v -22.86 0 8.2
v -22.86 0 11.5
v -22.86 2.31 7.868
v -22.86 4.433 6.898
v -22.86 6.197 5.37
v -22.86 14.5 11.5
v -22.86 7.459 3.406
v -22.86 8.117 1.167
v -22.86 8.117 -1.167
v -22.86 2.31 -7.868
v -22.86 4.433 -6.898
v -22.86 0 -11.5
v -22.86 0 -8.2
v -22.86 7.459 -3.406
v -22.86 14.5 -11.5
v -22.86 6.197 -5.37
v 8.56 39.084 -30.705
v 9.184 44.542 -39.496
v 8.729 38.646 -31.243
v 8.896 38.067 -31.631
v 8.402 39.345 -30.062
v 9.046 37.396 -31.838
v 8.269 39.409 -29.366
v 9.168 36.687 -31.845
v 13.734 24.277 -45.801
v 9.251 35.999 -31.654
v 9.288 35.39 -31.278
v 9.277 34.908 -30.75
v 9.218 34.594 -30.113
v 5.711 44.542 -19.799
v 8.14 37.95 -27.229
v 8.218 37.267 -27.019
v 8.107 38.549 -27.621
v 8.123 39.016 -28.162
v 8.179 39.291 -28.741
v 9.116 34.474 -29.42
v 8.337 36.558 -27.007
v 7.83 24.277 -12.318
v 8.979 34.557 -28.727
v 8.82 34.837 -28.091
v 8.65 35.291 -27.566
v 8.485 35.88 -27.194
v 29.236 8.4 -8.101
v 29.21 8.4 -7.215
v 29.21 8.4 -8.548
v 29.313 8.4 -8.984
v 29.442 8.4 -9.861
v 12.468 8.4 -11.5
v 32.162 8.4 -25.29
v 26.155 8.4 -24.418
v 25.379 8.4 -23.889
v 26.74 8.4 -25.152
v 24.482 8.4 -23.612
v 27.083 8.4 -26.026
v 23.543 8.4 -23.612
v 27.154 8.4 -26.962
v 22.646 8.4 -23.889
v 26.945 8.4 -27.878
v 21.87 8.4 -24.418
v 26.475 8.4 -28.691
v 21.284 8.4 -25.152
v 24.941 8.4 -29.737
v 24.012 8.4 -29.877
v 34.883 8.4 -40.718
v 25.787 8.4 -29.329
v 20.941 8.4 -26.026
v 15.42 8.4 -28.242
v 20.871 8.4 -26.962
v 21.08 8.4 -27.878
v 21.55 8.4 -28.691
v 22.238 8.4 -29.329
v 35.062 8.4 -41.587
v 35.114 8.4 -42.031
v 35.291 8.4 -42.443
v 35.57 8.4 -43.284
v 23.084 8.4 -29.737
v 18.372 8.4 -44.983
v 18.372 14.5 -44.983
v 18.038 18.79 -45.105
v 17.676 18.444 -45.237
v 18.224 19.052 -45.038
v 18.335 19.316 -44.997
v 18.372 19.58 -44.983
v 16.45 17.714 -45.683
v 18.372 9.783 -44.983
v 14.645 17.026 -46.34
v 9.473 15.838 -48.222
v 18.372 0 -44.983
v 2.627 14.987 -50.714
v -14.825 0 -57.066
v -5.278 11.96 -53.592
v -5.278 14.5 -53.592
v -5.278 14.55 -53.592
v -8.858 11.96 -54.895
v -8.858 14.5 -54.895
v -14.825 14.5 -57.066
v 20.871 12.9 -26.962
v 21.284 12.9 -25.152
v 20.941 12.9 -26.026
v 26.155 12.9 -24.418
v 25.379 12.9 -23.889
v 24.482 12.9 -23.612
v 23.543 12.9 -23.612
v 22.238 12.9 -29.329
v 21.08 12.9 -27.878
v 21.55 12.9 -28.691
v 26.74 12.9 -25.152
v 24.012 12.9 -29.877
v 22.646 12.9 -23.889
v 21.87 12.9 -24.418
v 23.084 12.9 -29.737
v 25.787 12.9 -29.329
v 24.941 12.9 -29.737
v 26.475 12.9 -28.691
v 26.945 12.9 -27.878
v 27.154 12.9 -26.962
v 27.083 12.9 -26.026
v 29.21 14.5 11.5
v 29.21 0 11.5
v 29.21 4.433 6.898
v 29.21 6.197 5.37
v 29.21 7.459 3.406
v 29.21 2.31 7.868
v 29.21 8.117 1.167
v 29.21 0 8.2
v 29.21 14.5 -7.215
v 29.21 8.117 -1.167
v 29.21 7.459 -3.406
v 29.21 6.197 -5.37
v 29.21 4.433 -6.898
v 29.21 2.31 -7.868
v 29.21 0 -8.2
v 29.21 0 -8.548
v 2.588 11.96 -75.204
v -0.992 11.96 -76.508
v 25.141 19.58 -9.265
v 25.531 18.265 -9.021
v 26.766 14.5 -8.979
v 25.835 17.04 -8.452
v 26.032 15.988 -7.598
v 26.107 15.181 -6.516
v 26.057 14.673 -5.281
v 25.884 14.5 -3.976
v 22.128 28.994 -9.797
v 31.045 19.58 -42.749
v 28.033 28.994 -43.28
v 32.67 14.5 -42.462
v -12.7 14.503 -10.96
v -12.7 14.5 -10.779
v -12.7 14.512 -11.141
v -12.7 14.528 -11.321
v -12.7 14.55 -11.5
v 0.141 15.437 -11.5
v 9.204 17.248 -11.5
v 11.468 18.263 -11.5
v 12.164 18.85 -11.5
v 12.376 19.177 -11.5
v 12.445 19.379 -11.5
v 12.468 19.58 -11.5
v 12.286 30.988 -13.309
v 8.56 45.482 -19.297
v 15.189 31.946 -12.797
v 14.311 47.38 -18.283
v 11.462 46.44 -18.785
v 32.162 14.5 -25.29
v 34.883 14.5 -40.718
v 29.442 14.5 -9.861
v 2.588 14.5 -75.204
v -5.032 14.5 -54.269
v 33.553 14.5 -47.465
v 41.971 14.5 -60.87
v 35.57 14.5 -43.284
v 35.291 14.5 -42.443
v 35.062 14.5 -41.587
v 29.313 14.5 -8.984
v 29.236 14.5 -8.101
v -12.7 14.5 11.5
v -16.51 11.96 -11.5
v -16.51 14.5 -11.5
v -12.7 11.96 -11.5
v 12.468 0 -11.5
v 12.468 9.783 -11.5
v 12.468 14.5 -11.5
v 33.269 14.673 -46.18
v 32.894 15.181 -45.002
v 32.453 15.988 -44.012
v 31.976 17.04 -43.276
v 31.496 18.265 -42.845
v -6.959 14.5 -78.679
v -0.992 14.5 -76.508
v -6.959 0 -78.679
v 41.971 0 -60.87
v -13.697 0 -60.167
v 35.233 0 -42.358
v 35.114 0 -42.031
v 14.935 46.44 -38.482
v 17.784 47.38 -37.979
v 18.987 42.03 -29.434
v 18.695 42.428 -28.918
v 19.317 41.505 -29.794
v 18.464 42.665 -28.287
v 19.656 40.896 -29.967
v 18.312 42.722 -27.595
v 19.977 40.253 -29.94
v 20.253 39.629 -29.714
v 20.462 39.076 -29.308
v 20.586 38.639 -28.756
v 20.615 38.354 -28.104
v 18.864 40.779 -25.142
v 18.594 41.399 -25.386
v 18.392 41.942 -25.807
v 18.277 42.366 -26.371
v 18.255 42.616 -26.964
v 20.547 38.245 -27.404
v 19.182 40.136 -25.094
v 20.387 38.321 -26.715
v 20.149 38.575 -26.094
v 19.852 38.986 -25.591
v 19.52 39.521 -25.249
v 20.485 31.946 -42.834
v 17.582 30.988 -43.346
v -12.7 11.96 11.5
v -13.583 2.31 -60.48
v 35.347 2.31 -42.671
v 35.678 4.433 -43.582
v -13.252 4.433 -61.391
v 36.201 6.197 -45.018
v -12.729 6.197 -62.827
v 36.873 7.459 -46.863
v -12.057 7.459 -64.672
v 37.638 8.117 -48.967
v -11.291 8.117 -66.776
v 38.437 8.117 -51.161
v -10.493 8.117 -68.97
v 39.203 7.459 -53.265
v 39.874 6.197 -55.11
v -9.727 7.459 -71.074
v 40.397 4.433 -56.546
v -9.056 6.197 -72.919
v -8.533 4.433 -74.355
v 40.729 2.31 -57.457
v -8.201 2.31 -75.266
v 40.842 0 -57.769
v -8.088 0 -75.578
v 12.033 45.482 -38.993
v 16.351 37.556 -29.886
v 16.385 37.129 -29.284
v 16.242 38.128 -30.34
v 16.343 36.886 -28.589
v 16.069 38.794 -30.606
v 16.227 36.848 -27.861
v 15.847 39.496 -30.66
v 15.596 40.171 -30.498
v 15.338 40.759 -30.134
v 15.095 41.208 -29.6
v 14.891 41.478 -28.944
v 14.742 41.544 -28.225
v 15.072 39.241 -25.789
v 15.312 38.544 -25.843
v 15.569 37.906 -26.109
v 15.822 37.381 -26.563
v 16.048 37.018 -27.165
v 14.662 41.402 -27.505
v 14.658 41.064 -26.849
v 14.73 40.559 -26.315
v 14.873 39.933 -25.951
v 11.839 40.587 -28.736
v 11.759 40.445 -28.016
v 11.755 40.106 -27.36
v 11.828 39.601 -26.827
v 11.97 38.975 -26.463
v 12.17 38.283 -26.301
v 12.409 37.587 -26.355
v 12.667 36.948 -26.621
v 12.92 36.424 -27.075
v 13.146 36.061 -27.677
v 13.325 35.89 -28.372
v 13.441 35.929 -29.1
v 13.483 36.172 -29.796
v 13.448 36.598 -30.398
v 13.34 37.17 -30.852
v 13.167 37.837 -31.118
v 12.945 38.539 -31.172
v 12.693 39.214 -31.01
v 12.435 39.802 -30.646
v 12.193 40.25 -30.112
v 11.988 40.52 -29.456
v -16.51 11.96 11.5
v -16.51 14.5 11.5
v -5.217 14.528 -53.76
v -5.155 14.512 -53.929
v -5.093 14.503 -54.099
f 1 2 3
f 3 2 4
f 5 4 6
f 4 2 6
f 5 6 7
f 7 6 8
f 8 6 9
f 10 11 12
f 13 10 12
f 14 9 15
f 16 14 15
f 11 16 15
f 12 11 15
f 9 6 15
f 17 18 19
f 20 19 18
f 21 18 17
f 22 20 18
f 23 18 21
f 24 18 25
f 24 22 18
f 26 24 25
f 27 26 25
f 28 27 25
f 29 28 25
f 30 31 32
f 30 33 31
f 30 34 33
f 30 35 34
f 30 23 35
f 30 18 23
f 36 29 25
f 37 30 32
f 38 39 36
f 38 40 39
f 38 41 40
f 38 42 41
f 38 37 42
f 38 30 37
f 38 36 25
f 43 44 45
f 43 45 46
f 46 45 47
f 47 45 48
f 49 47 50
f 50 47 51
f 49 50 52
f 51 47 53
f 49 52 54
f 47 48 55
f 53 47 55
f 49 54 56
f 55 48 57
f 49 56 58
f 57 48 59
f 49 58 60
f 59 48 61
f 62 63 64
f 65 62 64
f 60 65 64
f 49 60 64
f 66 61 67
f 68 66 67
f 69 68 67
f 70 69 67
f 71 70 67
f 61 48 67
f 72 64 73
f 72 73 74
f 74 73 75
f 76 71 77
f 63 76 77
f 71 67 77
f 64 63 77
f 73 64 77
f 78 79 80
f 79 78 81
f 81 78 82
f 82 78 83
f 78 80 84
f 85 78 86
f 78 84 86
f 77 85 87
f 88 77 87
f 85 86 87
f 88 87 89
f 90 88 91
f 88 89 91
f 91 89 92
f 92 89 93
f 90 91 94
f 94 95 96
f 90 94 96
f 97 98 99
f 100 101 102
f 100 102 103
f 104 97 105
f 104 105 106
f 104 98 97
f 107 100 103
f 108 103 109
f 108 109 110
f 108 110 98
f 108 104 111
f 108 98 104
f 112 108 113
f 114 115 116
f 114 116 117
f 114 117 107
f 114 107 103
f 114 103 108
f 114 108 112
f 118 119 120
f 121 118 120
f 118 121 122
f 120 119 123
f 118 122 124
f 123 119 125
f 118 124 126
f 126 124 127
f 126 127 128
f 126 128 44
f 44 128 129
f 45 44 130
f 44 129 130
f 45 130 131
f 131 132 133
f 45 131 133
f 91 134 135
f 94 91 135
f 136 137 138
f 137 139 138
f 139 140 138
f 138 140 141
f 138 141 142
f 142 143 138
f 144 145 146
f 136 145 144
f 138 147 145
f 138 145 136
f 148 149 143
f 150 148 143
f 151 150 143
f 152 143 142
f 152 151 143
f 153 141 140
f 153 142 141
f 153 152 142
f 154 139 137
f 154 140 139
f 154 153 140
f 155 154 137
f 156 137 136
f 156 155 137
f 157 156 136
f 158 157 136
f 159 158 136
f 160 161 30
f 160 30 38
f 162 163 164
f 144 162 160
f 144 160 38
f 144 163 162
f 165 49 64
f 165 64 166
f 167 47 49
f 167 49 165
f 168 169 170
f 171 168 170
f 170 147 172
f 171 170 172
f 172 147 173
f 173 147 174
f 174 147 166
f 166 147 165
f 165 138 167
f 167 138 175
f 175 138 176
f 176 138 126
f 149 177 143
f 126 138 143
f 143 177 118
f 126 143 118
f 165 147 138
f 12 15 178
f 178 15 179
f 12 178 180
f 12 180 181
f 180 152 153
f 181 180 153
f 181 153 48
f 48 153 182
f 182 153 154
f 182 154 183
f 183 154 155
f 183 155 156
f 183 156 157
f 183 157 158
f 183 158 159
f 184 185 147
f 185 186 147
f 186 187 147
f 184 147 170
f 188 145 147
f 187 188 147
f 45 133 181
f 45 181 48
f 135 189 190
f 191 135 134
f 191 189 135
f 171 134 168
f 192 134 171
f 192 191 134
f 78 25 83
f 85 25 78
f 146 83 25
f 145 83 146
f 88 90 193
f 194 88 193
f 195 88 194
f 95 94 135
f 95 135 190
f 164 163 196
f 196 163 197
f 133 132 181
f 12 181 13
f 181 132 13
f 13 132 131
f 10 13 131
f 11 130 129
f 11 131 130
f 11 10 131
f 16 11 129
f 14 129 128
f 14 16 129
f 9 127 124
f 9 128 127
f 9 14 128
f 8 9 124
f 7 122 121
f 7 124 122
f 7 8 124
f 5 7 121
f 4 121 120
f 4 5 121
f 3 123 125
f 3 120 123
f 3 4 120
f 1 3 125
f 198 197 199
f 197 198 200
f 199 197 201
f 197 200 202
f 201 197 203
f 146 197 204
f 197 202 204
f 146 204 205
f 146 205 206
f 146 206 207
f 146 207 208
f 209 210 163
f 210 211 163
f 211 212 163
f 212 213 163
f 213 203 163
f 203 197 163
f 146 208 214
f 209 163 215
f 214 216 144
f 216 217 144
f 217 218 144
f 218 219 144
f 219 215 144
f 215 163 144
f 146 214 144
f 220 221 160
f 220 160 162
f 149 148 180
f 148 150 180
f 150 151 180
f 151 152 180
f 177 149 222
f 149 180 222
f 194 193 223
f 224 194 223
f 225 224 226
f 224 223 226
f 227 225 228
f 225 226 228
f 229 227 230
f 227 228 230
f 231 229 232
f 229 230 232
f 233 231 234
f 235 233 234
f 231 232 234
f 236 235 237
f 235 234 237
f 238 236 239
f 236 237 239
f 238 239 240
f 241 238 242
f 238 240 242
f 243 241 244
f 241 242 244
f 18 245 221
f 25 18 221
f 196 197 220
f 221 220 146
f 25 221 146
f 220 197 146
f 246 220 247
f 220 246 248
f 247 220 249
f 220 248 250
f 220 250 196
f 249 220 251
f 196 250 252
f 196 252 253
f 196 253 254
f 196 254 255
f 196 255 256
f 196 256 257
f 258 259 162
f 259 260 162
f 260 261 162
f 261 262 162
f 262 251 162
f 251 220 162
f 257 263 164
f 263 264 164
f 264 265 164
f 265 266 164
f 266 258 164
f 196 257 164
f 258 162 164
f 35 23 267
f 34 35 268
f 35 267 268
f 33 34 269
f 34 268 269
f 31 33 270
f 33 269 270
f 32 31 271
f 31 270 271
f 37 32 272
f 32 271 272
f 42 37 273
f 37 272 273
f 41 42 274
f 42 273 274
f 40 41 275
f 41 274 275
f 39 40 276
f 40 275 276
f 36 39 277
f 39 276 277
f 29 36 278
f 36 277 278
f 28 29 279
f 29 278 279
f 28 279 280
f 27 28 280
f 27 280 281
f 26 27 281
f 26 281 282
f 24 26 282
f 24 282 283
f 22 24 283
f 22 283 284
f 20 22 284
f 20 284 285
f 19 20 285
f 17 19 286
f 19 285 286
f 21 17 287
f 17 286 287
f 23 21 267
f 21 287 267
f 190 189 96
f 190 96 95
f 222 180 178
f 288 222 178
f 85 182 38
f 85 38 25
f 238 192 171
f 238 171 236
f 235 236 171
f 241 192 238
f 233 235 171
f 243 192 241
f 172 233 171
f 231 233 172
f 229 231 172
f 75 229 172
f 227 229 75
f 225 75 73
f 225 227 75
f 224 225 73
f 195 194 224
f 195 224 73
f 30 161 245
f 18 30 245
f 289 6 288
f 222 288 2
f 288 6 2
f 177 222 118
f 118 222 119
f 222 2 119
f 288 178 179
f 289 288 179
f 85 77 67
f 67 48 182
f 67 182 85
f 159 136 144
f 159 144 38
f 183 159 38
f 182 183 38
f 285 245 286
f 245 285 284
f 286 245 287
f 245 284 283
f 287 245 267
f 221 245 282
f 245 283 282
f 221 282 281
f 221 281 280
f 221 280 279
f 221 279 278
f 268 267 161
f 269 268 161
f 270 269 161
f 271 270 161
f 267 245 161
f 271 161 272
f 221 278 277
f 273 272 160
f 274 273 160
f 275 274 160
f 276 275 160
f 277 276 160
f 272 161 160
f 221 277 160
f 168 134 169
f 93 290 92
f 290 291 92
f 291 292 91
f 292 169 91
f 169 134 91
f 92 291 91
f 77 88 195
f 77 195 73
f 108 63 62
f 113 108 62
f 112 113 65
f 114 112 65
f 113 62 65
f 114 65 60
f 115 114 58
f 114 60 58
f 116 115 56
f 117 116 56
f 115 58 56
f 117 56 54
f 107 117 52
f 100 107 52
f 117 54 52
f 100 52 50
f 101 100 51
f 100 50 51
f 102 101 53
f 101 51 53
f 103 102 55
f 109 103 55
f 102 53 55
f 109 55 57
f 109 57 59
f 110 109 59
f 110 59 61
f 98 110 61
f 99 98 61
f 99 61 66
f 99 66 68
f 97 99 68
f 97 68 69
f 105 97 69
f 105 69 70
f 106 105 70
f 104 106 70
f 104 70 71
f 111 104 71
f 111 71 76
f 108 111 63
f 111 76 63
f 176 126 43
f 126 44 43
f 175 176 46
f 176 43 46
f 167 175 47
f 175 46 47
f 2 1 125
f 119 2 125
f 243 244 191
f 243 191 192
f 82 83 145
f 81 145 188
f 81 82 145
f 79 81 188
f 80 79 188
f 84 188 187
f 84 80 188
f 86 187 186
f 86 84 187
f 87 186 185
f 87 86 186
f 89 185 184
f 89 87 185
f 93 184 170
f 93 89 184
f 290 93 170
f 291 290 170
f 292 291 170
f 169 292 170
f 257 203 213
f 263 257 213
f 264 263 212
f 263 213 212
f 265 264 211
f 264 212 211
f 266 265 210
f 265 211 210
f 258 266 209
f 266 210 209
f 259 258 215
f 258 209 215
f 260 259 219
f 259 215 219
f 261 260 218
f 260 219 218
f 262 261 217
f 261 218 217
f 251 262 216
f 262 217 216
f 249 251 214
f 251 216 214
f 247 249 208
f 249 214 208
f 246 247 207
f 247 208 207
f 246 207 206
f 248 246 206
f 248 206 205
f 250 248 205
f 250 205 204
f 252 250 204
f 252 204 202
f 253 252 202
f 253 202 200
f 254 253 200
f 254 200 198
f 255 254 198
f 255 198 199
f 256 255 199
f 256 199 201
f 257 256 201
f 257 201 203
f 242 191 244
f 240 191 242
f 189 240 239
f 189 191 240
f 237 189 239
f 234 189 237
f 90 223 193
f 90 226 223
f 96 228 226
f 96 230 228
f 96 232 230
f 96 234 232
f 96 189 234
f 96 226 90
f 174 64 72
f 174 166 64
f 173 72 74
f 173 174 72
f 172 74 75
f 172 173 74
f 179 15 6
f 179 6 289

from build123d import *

# Parameters (mm, degrees)
SKETCH2_W                  = 58.42
SKETCH2_H                  = 23
TWOLEGS_DEPTH              = 14.5
LEGSLOTS_DEPTH             = 62.281289151
SKETCH6_W                  = 3.81
SKETCH6_H                  = 2.54
GROOVE_DEPTH               = 25.4
MIDDLEBRIDGECUT_DEPTH      = 25.4
SKETCH8_W                  = 17
SKETCH8_H                  = 14.5
BRIDGE_DEPTH               = 17
BRIDGEUNDERCUT_REACH       = 53.567
SKETCH15_W                 = 17
SKETCH15_H                 = 8.4
MIRROR14_START             = 10.281893146
MIRROR14_OUTLINE_W         = 6.1
MIRROR14_OUTLINE_H         = 17
MIRROR14_DEPTH             = 17
CLAMPINCLINE_DEPTH         = 17
EXTRUDECONNECTOR_DEPTH     = 35.56
CONNECTORDRAFT_REACH       = 111.361
CONNECTORGROOVE_REACH      = 94.034
CONNECTORHOLE_REACH        = 111.361
SKETCH25_R                 = 2.4765
SKETCH26_R                 = 3.15
BRIDGEHOLE_DEPTH           = 4.5
FILLET1_R                  = 15.24
FILLET2_R                  = 5.08
CONNECTORDRAFT2_DEPTH      = 93.034308057
CONNECTORDRAFT2_DEPTH_BACK = 93.034308057
LEGSHORTEN_REACH           = 98.848
SKETCH28_W                 = 6.35
SKETCH28_H                 = 23


with BuildPart() as part:
    # Sketch2 → twolegs (new body)
    with BuildSketch(Plane(origin=(0, 0, 0), x_dir=(1, 0, 0), z_dir=(0, 1, 0))):
        Rectangle(SKETCH2_W, SKETCH2_H)
    twolegs = extrude(amount=TWOLEGS_DEPTH)

    # Sketch4 → legslots (cut, symmetric)
    with BuildSketch(Plane.ZY.offset(29.21)):
        with BuildLine():
            Line((-8.2, -58.921978701), (-8.2, 0))
            ThreePointArc((-8.2, 0), (0, 8.2), (8.2, 0))
            Line((8.2, 0), (8.2, -58.921978701))
            Line((8.2, -58.921978701), (8.2, -176.765936102))
            Line((8.2, -176.765936102), (-8.2, -176.765936102))
            Line((-8.2, -176.765936102), (-8.2, -58.921978701))
        make_face()
    legslots = extrude(amount=LEGSLOTS_DEPTH, both=True, mode=Mode.SUBTRACT)

    # Sketch6 → groove (cut)
    with BuildSketch(Plane(origin=(0, 0, -11.5), x_dir=(-1, 0, 0), z_dir=(0, 0, -1))):
        with Locations((14.605, 13.23)):
            Rectangle(SKETCH6_W, SKETCH6_H)
    groove = extrude(amount=-GROOVE_DEPTH, mode=Mode.SUBTRACT)

    # Sketch7 → middlebridgecut (cut)
    with BuildSketch(Plane(origin=(0, 14.5, 0), x_dir=(1, 0, 0), z_dir=(0, 1, 0))):
        Polygon((12.468268199, 11.5), (29.21, 8.54798098), (29.21, 11.5), align=None)
    extrude(amount=-MIDDLEBRIDGECUT_DEPTH, mode=Mode.SUBTRACT)

    # Sketch8 → bridge (add)
    with BuildSketch(Plane(origin=(2.342580113, 0, -13.285432008), x_dir=(-0.9848077530122094, 0, -0.17364817766692317), z_dir=(0.17364817766692317, 0, -0.9848077530122094))):
        with Locations((-18.781893146, 7.25)):
            Rectangle(SKETCH8_W, SKETCH8_H)
    extrude(amount=BRIDGE_DEPTH)

    # Sketch15 → bridgeundercut (cut, up to next)
    with BuildSketch(Plane(origin=(10.125688085, 0, 1.785432008), x_dir=(-0.17364817766692317, 0, 0.9848077530122095), z_dir=(-0.9848077530122095, 0, -0.17364817766692317)), mode=Mode.PRIVATE) as bridgeundercut_sk1:
        with Locations((-21.990381211, 4.2)):
            Rectangle(SKETCH15_W, SKETCH15_H)
    bridgeundercut_tool1 = extrude(bridgeundercut_sk1.sketch, amount=-BRIDGEUNDERCUT_REACH, mode=Mode.PRIVATE) & part.part
    bridgeundercut = bridgeundercut_tool1.solids().sort_by_distance((13.944278, 4.2, -19.870866))[0]
    add(bridgeundercut, mode=Mode.SUBTRACT)

    # Mirror14: read off the stored shape, not the designer's step
    # Mirror14 outline → Mirror14 (add)
    with BuildSketch(Plane(origin=(0, 0, 0), x_dir=(0, 1, 0), z_dir=(0.9848077530122094, 0, 0.17364817766692306)).offset(MIRROR14_START)):
        with Locations((11.45, -38.990381211)):
            Rectangle(MIRROR14_OUTLINE_W, MIRROR14_OUTLINE_H)
    extrude(amount=MIRROR14_DEPTH)

    # Mirror15: twolegs across plane
    add(twolegs.mirror(Plane(origin=(5.294599134, 0, -30.027163809), x_dir=(0.9848077530122092, 0, 0.17364817766692314), z_dir=(0.17364817766692314, 0, -0.9848077530122094))))

    # Mirror16: legslots, groove, bridgeundercut across plane
    add(legslots.mirror(Plane(origin=(5.294599134, 0, -30.027163809), x_dir=(0.9848077530122092, 0, 0.17364817766692314), z_dir=(0.17364817766692314, 0, -0.9848077530122094))), mode=Mode.SUBTRACT)
    add(groove.mirror(Plane(origin=(5.294599134, 0, -30.027163809), x_dir=(0.9848077530122092, 0, 0.17364817766692314), z_dir=(0.17364817766692314, 0, -0.9848077530122094))), mode=Mode.SUBTRACT)
    add(bridgeundercut.mirror(Plane(origin=(5.294599134, 0, -30.027163809), x_dir=(0.9848077530122092, 0, 0.17364817766692314), z_dir=(0.17364817766692314, 0, -0.9848077530122094))), mode=Mode.SUBTRACT)

    # Sketch21 → clampincline (cut, symmetric)
    with BuildSketch(Plane(origin=(5.294599134, 0, -30.027163809), x_dir=(-0.9848077530122094, 0, -0.17364817766692314), z_dir=(0.17364817766692314, 0, -0.9848077530122094))):
        Polygon((-24.800533146, 14.5), (-10.281893146, 9.782607901), (-10.281893146, 14.5), align=None)
    extrude(amount=CLAMPINCLINE_DEPTH, both=True, mode=Mode.SUBTRACT)

    # Sketch22 → extrudeconnector (add)
    with BuildSketch(Plane(origin=(-1.864440892, 5.826679393, -0.328751233), x_dir=(-0.19370062592752282, -0.006629130978421877, 0.98103828780418), z_dir=(-0.30432233187297286, 0.9510565162951554, -0.05366023794131847))):
        Polygon((-48.081564355, 27.0422172), (-14.089388689, 27.771596028), (-13.761901853, 12.509307601), (-47.754077519, 11.779928772), align=None)
    extrude(amount=EXTRUDECONNECTOR_DEPTH)

    # Sketch23 → connectordraft (cut, up to next)
    with BuildSketch(Plane(origin=(26.288198213, 8.673320607, 4.635318619), x_dir=(0.3484357800023436, -0.8710369750422688, -0.34624715930007605), z_dir=(0.9366078308002519, 0.30901699437494146, 0.16514923091290587)), mode=Mode.PRIVATE) as connectordraft_sk1:
        Polygon((-21.922562345, 53.820435592), (-0.501791973, 52.073152935), (-19.112117469, 60.231472918), align=None)
    connectordraft_tool1 = extrude(connectordraft_sk1.sketch, amount=-CONNECTORDRAFT_REACH, mode=Mode.PRIVATE) & part.part
    # Sketch23 → connectordraft (cut, up to next)
    with BuildSketch(Plane(origin=(26.288198213, 8.673320607, 4.635318619), x_dir=(0.3484357800023436, -0.8710369750422688, -0.34624715930007605), z_dir=(0.9366078308002519, 0.30901699437494146, 0.16514923091290587)), mode=Mode.PRIVATE) as connectordraft_sk2:
        Polygon((-14.152524229, 20.933828779), (-32.762849725, 29.092148762), (-29.952404848, 35.503186089), align=None)
    connectordraft_tool2 = extrude(connectordraft_sk2.sketch, amount=-CONNECTORDRAFT_REACH, mode=Mode.PRIVATE) & part.part
    add(connectordraft_tool1.solids().sort_by_distance((23.504771, 41.877747, -41.709143))[0], mode=Mode.SUBTRACT)
    add(connectordraft_tool2.solids().sort_by_distance((18.411091, 41.877747, -12.821449))[0], mode=Mode.SUBTRACT)

    # connectorgroove: up to this plane
    connectorgroove_end = Plane(origin=(-43.786464147, 27.065475321, -48.835745626), z_dir=(-0.06506049659943954, -0.3097627963249175, 0.9485853371179643))
    # Sketch24 → connectorgroove (cut, up to the surface)
    with BuildSketch(Plane(origin=(2.342580113, 0, -13.285432008), x_dir=(-0.9848077530122095, 0, -0.1736481776669232), z_dir=(0.1736481776669232, 0, -0.9848077530122095)), mode=Mode.PRIVATE) as connectorgroove_sk1:
        Polygon((-9.788420854, 30.987981431), (-12.735554786, 31.945563293), (-8.026135792, 46.439664601), (-5.079001859, 45.482082739), align=None)
    connectorgroove_tool1 = split(extrude(connectorgroove_sk1.sketch, amount=CONNECTORGROOVE_REACH, mode=Mode.PRIVATE), bisect_by=connectorgroove_end, keep=Keep.BOTH, mode=Mode.PRIVATE)
    add(connectorgroove_tool1.solids().sort_by_distance((11.114537, 38.713823, -11.738699))[0], mode=Mode.SUBTRACT)

    # connectorhole: up to this face of the body (flat: up to its plane)
    connectorhole_end = Plane(part.part.faces().sort_by_distance((10.456046087, 25.296664487, -29.117061452))[0])
    # Sketch25 → connectorhole (cut, up to the picked face)
    with BuildSketch(Plane(origin=(26.288198213, 8.673320607, 4.635318619), x_dir=(0.3484357800023436, -0.8710369750422688, -0.34624715930007605), z_dir=(0.9366078308002519, 0.30901699437494146, 0.16514923091290587)), mode=Mode.PRIVATE) as connectorhole_sk1:
        with Locations(Location((-18.958611536, 41.602440846, 0), (0, 0, 159.447358614))):
            Circle(SKETCH25_R)
    connectorhole_tool1 = split(extrude(connectorhole_sk1.sketch, amount=-CONNECTORHOLE_REACH, mode=Mode.PRIVATE), bisect_by=connectorhole_end, keep=Keep.BOTH, mode=Mode.PRIVATE)
    add(connectorhole_tool1.solids().sort_by(Axis((21.215591, 41.072519, -27.219863), (-0.9366078308002519, -0.30901699437494146, -0.16514923091290587)))[0], mode=Mode.SUBTRACT)

    # Sketch26 → bridgehole (cut)
    with BuildSketch(Plane.XZ.offset(-8.4)):
        with Locations(Location((24.012358933, -26.726717738, 0), (0, 0, 270))):
            Circle(SKETCH26_R)
    extrude(amount=-BRIDGEHOLE_DEPTH, mode=Mode.SUBTRACT)

    # Fillet1
    fillet1_edges = [part.edges().sort_by_distance(p)[0] for p in [
        (29.21, 11.45, -8.54798098),
        (35.114038041, 11.45, -42.031444582),
    ]]
    fillet(fillet1_edges, radius=FILLET1_R)

    # Fillet2
    # the kernel refuses this fillet: 5.08 mm, written as the material it adds along each edge
    with BuildSketch(Plane(origin=(-25.052907191, 14.5, -18.115995569), x_dir=(-0.17364817766692314, 0, 0.9848077530122094), z_dir=(0.9848077530122094, 0, 0.17364817766692314))) as fillet2_piece_1_section:
        with BuildLine():
            CenterArc((FILLET2_R, -FILLET2_R), FILLET2_R, 90, 90)
            Line((0, -FILLET2_R), (0, 0))
            Line((0, 0), (FILLET2_R, 0))
        make_face()
    fillet2_piece_1 = extrude(amount=65.31864, mode=Mode.PRIVATE)
    fillet2_piece_1 = split(fillet2_piece_1, bisect_by=Plane(origin=(-12.7, 14.5, -18.115995569), z_dir=(1, 0, 0)), keep=Keep.TOP, mode=Mode.PRIVATE)
    fillet2_piece_1 = split(fillet2_piece_1, bisect_by=Plane(origin=(-25.052907191, 14.5, -11.5), z_dir=(0, 0, 1)), keep=Keep.TOP, mode=Mode.PRIVATE)
    fillet2_piece_1 = split(fillet2_piece_1, bisect_by=Plane(origin=(21.81803989, 29.964230294, -9.851382987), z_dir=(-0.9366078308002517, -0.30901699437494173, -0.16514923091290615)), keep=Keep.TOP, mode=Mode.PRIVATE)
    add(fillet2_piece_1)
    with BuildSketch(Plane(origin=(-19.14886915, 14.5, -51.599459172), x_dir=(0.17364817766692314, 0, -0.9848077530122094), z_dir=(0.9848077530122094, 0, 0.17364817766692314))) as fillet2_piece_2_section:
        with BuildLine():
            CenterArc((FILLET2_R, FILLET2_R), FILLET2_R, 180, 90)
            Line((0, FILLET2_R), (0, 0))
            Line((0, 0), (FILLET2_R, 0))
        make_face()
    fillet2_piece_2 = extrude(amount=65.31864, mode=Mode.PRIVATE)
    fillet2_piece_2 = split(fillet2_piece_2, bisect_by=Plane(origin=(27.722077931, 29.964230294, -43.33484659), z_dir=(-0.9366078308002517, -0.30901699437494173, -0.16514923091290615)), keep=Keep.TOP, mode=Mode.PRIVATE)
    fillet2_piece_2 = split(fillet2_piece_2, bisect_by=Plane(origin=(-7.540933418, 14.5, -47.374516084), z_dir=(0.9396926207859135, 0, 0.342020143325655)), keep=Keep.TOP, mode=Mode.PRIVATE)
    fillet2_piece_2 = split(fillet2_piece_2, bisect_by=Plane(origin=(-16.886065398, 14.5, -57.816461387), z_dir=(0.342020143325655, 0, -0.9396926207859134)), keep=Keep.TOP, mode=Mode.PRIVATE)
    add(fillet2_piece_2)

    # Sketch27 → connectordraft2 (cut, two sides: drawn at the far end of the back side and taken through both)
    with BuildSketch(Plane(origin=(2.342580113, 0, -13.285432008), x_dir=(-0.9848077530122095, 0, -0.1736481776669232), z_dir=(0.1736481776669232, 0, -0.9848077530122095)).offset(-CONNECTORDRAFT2_DEPTH_BACK)):
        Polygon((-10.919012309, 47.37961716), (-20.091114151, 28.994101308), (-13.811888826, 48.319569719), align=None)
        Polygon((-2.186125342, 44.54213018), (-5.572474151, 24.27670921), (0.706751174, 43.602177621), align=None)
    extrude(amount=CONNECTORDRAFT2_DEPTH + CONNECTORDRAFT2_DEPTH_BACK, mode=Mode.SUBTRACT)

    # legshorten: up to this face of the body (flat: up to its plane)
    legshorten_end = Plane(part.part.faces().sort_by_distance((-3.474076782, 0, -9.752083384))[0])
    # Sketch28 → legshorten (cut, up to the picked face)
    with BuildSketch(Plane(origin=(0, 14.5, 0), x_dir=(1, 0, 0), z_dir=(0, 1, 0)), mode=Mode.PRIVATE) as legshorten_sk1:
        with Locations((-26.035, 0)):
            Rectangle(SKETCH28_W, SKETCH28_H)
    legshorten_tool1 = split(extrude(legshorten_sk1.sketch, amount=-LEGSHORTEN_REACH, mode=Mode.PRIVATE), bisect_by=legshorten_end, keep=Keep.BOTH, mode=Mode.PRIVATE)
    legshorten = legshorten_tool1.solids().sort_by(Axis((-26.035, 14.5, 0), (0, -1, 0)))[0]
    add(legshorten, mode=Mode.SUBTRACT)

    # Mirror17: legshorten across plane
    add(legshorten.mirror(Plane(origin=(5.294599134, 0, -30.027163809), x_dir=(0.9848077530122092, 0, 0.17364817766692314), z_dir=(0.17364817766692314, 0, -0.9848077530122094))), mode=Mode.SUBTRACT)


solid = part.part
